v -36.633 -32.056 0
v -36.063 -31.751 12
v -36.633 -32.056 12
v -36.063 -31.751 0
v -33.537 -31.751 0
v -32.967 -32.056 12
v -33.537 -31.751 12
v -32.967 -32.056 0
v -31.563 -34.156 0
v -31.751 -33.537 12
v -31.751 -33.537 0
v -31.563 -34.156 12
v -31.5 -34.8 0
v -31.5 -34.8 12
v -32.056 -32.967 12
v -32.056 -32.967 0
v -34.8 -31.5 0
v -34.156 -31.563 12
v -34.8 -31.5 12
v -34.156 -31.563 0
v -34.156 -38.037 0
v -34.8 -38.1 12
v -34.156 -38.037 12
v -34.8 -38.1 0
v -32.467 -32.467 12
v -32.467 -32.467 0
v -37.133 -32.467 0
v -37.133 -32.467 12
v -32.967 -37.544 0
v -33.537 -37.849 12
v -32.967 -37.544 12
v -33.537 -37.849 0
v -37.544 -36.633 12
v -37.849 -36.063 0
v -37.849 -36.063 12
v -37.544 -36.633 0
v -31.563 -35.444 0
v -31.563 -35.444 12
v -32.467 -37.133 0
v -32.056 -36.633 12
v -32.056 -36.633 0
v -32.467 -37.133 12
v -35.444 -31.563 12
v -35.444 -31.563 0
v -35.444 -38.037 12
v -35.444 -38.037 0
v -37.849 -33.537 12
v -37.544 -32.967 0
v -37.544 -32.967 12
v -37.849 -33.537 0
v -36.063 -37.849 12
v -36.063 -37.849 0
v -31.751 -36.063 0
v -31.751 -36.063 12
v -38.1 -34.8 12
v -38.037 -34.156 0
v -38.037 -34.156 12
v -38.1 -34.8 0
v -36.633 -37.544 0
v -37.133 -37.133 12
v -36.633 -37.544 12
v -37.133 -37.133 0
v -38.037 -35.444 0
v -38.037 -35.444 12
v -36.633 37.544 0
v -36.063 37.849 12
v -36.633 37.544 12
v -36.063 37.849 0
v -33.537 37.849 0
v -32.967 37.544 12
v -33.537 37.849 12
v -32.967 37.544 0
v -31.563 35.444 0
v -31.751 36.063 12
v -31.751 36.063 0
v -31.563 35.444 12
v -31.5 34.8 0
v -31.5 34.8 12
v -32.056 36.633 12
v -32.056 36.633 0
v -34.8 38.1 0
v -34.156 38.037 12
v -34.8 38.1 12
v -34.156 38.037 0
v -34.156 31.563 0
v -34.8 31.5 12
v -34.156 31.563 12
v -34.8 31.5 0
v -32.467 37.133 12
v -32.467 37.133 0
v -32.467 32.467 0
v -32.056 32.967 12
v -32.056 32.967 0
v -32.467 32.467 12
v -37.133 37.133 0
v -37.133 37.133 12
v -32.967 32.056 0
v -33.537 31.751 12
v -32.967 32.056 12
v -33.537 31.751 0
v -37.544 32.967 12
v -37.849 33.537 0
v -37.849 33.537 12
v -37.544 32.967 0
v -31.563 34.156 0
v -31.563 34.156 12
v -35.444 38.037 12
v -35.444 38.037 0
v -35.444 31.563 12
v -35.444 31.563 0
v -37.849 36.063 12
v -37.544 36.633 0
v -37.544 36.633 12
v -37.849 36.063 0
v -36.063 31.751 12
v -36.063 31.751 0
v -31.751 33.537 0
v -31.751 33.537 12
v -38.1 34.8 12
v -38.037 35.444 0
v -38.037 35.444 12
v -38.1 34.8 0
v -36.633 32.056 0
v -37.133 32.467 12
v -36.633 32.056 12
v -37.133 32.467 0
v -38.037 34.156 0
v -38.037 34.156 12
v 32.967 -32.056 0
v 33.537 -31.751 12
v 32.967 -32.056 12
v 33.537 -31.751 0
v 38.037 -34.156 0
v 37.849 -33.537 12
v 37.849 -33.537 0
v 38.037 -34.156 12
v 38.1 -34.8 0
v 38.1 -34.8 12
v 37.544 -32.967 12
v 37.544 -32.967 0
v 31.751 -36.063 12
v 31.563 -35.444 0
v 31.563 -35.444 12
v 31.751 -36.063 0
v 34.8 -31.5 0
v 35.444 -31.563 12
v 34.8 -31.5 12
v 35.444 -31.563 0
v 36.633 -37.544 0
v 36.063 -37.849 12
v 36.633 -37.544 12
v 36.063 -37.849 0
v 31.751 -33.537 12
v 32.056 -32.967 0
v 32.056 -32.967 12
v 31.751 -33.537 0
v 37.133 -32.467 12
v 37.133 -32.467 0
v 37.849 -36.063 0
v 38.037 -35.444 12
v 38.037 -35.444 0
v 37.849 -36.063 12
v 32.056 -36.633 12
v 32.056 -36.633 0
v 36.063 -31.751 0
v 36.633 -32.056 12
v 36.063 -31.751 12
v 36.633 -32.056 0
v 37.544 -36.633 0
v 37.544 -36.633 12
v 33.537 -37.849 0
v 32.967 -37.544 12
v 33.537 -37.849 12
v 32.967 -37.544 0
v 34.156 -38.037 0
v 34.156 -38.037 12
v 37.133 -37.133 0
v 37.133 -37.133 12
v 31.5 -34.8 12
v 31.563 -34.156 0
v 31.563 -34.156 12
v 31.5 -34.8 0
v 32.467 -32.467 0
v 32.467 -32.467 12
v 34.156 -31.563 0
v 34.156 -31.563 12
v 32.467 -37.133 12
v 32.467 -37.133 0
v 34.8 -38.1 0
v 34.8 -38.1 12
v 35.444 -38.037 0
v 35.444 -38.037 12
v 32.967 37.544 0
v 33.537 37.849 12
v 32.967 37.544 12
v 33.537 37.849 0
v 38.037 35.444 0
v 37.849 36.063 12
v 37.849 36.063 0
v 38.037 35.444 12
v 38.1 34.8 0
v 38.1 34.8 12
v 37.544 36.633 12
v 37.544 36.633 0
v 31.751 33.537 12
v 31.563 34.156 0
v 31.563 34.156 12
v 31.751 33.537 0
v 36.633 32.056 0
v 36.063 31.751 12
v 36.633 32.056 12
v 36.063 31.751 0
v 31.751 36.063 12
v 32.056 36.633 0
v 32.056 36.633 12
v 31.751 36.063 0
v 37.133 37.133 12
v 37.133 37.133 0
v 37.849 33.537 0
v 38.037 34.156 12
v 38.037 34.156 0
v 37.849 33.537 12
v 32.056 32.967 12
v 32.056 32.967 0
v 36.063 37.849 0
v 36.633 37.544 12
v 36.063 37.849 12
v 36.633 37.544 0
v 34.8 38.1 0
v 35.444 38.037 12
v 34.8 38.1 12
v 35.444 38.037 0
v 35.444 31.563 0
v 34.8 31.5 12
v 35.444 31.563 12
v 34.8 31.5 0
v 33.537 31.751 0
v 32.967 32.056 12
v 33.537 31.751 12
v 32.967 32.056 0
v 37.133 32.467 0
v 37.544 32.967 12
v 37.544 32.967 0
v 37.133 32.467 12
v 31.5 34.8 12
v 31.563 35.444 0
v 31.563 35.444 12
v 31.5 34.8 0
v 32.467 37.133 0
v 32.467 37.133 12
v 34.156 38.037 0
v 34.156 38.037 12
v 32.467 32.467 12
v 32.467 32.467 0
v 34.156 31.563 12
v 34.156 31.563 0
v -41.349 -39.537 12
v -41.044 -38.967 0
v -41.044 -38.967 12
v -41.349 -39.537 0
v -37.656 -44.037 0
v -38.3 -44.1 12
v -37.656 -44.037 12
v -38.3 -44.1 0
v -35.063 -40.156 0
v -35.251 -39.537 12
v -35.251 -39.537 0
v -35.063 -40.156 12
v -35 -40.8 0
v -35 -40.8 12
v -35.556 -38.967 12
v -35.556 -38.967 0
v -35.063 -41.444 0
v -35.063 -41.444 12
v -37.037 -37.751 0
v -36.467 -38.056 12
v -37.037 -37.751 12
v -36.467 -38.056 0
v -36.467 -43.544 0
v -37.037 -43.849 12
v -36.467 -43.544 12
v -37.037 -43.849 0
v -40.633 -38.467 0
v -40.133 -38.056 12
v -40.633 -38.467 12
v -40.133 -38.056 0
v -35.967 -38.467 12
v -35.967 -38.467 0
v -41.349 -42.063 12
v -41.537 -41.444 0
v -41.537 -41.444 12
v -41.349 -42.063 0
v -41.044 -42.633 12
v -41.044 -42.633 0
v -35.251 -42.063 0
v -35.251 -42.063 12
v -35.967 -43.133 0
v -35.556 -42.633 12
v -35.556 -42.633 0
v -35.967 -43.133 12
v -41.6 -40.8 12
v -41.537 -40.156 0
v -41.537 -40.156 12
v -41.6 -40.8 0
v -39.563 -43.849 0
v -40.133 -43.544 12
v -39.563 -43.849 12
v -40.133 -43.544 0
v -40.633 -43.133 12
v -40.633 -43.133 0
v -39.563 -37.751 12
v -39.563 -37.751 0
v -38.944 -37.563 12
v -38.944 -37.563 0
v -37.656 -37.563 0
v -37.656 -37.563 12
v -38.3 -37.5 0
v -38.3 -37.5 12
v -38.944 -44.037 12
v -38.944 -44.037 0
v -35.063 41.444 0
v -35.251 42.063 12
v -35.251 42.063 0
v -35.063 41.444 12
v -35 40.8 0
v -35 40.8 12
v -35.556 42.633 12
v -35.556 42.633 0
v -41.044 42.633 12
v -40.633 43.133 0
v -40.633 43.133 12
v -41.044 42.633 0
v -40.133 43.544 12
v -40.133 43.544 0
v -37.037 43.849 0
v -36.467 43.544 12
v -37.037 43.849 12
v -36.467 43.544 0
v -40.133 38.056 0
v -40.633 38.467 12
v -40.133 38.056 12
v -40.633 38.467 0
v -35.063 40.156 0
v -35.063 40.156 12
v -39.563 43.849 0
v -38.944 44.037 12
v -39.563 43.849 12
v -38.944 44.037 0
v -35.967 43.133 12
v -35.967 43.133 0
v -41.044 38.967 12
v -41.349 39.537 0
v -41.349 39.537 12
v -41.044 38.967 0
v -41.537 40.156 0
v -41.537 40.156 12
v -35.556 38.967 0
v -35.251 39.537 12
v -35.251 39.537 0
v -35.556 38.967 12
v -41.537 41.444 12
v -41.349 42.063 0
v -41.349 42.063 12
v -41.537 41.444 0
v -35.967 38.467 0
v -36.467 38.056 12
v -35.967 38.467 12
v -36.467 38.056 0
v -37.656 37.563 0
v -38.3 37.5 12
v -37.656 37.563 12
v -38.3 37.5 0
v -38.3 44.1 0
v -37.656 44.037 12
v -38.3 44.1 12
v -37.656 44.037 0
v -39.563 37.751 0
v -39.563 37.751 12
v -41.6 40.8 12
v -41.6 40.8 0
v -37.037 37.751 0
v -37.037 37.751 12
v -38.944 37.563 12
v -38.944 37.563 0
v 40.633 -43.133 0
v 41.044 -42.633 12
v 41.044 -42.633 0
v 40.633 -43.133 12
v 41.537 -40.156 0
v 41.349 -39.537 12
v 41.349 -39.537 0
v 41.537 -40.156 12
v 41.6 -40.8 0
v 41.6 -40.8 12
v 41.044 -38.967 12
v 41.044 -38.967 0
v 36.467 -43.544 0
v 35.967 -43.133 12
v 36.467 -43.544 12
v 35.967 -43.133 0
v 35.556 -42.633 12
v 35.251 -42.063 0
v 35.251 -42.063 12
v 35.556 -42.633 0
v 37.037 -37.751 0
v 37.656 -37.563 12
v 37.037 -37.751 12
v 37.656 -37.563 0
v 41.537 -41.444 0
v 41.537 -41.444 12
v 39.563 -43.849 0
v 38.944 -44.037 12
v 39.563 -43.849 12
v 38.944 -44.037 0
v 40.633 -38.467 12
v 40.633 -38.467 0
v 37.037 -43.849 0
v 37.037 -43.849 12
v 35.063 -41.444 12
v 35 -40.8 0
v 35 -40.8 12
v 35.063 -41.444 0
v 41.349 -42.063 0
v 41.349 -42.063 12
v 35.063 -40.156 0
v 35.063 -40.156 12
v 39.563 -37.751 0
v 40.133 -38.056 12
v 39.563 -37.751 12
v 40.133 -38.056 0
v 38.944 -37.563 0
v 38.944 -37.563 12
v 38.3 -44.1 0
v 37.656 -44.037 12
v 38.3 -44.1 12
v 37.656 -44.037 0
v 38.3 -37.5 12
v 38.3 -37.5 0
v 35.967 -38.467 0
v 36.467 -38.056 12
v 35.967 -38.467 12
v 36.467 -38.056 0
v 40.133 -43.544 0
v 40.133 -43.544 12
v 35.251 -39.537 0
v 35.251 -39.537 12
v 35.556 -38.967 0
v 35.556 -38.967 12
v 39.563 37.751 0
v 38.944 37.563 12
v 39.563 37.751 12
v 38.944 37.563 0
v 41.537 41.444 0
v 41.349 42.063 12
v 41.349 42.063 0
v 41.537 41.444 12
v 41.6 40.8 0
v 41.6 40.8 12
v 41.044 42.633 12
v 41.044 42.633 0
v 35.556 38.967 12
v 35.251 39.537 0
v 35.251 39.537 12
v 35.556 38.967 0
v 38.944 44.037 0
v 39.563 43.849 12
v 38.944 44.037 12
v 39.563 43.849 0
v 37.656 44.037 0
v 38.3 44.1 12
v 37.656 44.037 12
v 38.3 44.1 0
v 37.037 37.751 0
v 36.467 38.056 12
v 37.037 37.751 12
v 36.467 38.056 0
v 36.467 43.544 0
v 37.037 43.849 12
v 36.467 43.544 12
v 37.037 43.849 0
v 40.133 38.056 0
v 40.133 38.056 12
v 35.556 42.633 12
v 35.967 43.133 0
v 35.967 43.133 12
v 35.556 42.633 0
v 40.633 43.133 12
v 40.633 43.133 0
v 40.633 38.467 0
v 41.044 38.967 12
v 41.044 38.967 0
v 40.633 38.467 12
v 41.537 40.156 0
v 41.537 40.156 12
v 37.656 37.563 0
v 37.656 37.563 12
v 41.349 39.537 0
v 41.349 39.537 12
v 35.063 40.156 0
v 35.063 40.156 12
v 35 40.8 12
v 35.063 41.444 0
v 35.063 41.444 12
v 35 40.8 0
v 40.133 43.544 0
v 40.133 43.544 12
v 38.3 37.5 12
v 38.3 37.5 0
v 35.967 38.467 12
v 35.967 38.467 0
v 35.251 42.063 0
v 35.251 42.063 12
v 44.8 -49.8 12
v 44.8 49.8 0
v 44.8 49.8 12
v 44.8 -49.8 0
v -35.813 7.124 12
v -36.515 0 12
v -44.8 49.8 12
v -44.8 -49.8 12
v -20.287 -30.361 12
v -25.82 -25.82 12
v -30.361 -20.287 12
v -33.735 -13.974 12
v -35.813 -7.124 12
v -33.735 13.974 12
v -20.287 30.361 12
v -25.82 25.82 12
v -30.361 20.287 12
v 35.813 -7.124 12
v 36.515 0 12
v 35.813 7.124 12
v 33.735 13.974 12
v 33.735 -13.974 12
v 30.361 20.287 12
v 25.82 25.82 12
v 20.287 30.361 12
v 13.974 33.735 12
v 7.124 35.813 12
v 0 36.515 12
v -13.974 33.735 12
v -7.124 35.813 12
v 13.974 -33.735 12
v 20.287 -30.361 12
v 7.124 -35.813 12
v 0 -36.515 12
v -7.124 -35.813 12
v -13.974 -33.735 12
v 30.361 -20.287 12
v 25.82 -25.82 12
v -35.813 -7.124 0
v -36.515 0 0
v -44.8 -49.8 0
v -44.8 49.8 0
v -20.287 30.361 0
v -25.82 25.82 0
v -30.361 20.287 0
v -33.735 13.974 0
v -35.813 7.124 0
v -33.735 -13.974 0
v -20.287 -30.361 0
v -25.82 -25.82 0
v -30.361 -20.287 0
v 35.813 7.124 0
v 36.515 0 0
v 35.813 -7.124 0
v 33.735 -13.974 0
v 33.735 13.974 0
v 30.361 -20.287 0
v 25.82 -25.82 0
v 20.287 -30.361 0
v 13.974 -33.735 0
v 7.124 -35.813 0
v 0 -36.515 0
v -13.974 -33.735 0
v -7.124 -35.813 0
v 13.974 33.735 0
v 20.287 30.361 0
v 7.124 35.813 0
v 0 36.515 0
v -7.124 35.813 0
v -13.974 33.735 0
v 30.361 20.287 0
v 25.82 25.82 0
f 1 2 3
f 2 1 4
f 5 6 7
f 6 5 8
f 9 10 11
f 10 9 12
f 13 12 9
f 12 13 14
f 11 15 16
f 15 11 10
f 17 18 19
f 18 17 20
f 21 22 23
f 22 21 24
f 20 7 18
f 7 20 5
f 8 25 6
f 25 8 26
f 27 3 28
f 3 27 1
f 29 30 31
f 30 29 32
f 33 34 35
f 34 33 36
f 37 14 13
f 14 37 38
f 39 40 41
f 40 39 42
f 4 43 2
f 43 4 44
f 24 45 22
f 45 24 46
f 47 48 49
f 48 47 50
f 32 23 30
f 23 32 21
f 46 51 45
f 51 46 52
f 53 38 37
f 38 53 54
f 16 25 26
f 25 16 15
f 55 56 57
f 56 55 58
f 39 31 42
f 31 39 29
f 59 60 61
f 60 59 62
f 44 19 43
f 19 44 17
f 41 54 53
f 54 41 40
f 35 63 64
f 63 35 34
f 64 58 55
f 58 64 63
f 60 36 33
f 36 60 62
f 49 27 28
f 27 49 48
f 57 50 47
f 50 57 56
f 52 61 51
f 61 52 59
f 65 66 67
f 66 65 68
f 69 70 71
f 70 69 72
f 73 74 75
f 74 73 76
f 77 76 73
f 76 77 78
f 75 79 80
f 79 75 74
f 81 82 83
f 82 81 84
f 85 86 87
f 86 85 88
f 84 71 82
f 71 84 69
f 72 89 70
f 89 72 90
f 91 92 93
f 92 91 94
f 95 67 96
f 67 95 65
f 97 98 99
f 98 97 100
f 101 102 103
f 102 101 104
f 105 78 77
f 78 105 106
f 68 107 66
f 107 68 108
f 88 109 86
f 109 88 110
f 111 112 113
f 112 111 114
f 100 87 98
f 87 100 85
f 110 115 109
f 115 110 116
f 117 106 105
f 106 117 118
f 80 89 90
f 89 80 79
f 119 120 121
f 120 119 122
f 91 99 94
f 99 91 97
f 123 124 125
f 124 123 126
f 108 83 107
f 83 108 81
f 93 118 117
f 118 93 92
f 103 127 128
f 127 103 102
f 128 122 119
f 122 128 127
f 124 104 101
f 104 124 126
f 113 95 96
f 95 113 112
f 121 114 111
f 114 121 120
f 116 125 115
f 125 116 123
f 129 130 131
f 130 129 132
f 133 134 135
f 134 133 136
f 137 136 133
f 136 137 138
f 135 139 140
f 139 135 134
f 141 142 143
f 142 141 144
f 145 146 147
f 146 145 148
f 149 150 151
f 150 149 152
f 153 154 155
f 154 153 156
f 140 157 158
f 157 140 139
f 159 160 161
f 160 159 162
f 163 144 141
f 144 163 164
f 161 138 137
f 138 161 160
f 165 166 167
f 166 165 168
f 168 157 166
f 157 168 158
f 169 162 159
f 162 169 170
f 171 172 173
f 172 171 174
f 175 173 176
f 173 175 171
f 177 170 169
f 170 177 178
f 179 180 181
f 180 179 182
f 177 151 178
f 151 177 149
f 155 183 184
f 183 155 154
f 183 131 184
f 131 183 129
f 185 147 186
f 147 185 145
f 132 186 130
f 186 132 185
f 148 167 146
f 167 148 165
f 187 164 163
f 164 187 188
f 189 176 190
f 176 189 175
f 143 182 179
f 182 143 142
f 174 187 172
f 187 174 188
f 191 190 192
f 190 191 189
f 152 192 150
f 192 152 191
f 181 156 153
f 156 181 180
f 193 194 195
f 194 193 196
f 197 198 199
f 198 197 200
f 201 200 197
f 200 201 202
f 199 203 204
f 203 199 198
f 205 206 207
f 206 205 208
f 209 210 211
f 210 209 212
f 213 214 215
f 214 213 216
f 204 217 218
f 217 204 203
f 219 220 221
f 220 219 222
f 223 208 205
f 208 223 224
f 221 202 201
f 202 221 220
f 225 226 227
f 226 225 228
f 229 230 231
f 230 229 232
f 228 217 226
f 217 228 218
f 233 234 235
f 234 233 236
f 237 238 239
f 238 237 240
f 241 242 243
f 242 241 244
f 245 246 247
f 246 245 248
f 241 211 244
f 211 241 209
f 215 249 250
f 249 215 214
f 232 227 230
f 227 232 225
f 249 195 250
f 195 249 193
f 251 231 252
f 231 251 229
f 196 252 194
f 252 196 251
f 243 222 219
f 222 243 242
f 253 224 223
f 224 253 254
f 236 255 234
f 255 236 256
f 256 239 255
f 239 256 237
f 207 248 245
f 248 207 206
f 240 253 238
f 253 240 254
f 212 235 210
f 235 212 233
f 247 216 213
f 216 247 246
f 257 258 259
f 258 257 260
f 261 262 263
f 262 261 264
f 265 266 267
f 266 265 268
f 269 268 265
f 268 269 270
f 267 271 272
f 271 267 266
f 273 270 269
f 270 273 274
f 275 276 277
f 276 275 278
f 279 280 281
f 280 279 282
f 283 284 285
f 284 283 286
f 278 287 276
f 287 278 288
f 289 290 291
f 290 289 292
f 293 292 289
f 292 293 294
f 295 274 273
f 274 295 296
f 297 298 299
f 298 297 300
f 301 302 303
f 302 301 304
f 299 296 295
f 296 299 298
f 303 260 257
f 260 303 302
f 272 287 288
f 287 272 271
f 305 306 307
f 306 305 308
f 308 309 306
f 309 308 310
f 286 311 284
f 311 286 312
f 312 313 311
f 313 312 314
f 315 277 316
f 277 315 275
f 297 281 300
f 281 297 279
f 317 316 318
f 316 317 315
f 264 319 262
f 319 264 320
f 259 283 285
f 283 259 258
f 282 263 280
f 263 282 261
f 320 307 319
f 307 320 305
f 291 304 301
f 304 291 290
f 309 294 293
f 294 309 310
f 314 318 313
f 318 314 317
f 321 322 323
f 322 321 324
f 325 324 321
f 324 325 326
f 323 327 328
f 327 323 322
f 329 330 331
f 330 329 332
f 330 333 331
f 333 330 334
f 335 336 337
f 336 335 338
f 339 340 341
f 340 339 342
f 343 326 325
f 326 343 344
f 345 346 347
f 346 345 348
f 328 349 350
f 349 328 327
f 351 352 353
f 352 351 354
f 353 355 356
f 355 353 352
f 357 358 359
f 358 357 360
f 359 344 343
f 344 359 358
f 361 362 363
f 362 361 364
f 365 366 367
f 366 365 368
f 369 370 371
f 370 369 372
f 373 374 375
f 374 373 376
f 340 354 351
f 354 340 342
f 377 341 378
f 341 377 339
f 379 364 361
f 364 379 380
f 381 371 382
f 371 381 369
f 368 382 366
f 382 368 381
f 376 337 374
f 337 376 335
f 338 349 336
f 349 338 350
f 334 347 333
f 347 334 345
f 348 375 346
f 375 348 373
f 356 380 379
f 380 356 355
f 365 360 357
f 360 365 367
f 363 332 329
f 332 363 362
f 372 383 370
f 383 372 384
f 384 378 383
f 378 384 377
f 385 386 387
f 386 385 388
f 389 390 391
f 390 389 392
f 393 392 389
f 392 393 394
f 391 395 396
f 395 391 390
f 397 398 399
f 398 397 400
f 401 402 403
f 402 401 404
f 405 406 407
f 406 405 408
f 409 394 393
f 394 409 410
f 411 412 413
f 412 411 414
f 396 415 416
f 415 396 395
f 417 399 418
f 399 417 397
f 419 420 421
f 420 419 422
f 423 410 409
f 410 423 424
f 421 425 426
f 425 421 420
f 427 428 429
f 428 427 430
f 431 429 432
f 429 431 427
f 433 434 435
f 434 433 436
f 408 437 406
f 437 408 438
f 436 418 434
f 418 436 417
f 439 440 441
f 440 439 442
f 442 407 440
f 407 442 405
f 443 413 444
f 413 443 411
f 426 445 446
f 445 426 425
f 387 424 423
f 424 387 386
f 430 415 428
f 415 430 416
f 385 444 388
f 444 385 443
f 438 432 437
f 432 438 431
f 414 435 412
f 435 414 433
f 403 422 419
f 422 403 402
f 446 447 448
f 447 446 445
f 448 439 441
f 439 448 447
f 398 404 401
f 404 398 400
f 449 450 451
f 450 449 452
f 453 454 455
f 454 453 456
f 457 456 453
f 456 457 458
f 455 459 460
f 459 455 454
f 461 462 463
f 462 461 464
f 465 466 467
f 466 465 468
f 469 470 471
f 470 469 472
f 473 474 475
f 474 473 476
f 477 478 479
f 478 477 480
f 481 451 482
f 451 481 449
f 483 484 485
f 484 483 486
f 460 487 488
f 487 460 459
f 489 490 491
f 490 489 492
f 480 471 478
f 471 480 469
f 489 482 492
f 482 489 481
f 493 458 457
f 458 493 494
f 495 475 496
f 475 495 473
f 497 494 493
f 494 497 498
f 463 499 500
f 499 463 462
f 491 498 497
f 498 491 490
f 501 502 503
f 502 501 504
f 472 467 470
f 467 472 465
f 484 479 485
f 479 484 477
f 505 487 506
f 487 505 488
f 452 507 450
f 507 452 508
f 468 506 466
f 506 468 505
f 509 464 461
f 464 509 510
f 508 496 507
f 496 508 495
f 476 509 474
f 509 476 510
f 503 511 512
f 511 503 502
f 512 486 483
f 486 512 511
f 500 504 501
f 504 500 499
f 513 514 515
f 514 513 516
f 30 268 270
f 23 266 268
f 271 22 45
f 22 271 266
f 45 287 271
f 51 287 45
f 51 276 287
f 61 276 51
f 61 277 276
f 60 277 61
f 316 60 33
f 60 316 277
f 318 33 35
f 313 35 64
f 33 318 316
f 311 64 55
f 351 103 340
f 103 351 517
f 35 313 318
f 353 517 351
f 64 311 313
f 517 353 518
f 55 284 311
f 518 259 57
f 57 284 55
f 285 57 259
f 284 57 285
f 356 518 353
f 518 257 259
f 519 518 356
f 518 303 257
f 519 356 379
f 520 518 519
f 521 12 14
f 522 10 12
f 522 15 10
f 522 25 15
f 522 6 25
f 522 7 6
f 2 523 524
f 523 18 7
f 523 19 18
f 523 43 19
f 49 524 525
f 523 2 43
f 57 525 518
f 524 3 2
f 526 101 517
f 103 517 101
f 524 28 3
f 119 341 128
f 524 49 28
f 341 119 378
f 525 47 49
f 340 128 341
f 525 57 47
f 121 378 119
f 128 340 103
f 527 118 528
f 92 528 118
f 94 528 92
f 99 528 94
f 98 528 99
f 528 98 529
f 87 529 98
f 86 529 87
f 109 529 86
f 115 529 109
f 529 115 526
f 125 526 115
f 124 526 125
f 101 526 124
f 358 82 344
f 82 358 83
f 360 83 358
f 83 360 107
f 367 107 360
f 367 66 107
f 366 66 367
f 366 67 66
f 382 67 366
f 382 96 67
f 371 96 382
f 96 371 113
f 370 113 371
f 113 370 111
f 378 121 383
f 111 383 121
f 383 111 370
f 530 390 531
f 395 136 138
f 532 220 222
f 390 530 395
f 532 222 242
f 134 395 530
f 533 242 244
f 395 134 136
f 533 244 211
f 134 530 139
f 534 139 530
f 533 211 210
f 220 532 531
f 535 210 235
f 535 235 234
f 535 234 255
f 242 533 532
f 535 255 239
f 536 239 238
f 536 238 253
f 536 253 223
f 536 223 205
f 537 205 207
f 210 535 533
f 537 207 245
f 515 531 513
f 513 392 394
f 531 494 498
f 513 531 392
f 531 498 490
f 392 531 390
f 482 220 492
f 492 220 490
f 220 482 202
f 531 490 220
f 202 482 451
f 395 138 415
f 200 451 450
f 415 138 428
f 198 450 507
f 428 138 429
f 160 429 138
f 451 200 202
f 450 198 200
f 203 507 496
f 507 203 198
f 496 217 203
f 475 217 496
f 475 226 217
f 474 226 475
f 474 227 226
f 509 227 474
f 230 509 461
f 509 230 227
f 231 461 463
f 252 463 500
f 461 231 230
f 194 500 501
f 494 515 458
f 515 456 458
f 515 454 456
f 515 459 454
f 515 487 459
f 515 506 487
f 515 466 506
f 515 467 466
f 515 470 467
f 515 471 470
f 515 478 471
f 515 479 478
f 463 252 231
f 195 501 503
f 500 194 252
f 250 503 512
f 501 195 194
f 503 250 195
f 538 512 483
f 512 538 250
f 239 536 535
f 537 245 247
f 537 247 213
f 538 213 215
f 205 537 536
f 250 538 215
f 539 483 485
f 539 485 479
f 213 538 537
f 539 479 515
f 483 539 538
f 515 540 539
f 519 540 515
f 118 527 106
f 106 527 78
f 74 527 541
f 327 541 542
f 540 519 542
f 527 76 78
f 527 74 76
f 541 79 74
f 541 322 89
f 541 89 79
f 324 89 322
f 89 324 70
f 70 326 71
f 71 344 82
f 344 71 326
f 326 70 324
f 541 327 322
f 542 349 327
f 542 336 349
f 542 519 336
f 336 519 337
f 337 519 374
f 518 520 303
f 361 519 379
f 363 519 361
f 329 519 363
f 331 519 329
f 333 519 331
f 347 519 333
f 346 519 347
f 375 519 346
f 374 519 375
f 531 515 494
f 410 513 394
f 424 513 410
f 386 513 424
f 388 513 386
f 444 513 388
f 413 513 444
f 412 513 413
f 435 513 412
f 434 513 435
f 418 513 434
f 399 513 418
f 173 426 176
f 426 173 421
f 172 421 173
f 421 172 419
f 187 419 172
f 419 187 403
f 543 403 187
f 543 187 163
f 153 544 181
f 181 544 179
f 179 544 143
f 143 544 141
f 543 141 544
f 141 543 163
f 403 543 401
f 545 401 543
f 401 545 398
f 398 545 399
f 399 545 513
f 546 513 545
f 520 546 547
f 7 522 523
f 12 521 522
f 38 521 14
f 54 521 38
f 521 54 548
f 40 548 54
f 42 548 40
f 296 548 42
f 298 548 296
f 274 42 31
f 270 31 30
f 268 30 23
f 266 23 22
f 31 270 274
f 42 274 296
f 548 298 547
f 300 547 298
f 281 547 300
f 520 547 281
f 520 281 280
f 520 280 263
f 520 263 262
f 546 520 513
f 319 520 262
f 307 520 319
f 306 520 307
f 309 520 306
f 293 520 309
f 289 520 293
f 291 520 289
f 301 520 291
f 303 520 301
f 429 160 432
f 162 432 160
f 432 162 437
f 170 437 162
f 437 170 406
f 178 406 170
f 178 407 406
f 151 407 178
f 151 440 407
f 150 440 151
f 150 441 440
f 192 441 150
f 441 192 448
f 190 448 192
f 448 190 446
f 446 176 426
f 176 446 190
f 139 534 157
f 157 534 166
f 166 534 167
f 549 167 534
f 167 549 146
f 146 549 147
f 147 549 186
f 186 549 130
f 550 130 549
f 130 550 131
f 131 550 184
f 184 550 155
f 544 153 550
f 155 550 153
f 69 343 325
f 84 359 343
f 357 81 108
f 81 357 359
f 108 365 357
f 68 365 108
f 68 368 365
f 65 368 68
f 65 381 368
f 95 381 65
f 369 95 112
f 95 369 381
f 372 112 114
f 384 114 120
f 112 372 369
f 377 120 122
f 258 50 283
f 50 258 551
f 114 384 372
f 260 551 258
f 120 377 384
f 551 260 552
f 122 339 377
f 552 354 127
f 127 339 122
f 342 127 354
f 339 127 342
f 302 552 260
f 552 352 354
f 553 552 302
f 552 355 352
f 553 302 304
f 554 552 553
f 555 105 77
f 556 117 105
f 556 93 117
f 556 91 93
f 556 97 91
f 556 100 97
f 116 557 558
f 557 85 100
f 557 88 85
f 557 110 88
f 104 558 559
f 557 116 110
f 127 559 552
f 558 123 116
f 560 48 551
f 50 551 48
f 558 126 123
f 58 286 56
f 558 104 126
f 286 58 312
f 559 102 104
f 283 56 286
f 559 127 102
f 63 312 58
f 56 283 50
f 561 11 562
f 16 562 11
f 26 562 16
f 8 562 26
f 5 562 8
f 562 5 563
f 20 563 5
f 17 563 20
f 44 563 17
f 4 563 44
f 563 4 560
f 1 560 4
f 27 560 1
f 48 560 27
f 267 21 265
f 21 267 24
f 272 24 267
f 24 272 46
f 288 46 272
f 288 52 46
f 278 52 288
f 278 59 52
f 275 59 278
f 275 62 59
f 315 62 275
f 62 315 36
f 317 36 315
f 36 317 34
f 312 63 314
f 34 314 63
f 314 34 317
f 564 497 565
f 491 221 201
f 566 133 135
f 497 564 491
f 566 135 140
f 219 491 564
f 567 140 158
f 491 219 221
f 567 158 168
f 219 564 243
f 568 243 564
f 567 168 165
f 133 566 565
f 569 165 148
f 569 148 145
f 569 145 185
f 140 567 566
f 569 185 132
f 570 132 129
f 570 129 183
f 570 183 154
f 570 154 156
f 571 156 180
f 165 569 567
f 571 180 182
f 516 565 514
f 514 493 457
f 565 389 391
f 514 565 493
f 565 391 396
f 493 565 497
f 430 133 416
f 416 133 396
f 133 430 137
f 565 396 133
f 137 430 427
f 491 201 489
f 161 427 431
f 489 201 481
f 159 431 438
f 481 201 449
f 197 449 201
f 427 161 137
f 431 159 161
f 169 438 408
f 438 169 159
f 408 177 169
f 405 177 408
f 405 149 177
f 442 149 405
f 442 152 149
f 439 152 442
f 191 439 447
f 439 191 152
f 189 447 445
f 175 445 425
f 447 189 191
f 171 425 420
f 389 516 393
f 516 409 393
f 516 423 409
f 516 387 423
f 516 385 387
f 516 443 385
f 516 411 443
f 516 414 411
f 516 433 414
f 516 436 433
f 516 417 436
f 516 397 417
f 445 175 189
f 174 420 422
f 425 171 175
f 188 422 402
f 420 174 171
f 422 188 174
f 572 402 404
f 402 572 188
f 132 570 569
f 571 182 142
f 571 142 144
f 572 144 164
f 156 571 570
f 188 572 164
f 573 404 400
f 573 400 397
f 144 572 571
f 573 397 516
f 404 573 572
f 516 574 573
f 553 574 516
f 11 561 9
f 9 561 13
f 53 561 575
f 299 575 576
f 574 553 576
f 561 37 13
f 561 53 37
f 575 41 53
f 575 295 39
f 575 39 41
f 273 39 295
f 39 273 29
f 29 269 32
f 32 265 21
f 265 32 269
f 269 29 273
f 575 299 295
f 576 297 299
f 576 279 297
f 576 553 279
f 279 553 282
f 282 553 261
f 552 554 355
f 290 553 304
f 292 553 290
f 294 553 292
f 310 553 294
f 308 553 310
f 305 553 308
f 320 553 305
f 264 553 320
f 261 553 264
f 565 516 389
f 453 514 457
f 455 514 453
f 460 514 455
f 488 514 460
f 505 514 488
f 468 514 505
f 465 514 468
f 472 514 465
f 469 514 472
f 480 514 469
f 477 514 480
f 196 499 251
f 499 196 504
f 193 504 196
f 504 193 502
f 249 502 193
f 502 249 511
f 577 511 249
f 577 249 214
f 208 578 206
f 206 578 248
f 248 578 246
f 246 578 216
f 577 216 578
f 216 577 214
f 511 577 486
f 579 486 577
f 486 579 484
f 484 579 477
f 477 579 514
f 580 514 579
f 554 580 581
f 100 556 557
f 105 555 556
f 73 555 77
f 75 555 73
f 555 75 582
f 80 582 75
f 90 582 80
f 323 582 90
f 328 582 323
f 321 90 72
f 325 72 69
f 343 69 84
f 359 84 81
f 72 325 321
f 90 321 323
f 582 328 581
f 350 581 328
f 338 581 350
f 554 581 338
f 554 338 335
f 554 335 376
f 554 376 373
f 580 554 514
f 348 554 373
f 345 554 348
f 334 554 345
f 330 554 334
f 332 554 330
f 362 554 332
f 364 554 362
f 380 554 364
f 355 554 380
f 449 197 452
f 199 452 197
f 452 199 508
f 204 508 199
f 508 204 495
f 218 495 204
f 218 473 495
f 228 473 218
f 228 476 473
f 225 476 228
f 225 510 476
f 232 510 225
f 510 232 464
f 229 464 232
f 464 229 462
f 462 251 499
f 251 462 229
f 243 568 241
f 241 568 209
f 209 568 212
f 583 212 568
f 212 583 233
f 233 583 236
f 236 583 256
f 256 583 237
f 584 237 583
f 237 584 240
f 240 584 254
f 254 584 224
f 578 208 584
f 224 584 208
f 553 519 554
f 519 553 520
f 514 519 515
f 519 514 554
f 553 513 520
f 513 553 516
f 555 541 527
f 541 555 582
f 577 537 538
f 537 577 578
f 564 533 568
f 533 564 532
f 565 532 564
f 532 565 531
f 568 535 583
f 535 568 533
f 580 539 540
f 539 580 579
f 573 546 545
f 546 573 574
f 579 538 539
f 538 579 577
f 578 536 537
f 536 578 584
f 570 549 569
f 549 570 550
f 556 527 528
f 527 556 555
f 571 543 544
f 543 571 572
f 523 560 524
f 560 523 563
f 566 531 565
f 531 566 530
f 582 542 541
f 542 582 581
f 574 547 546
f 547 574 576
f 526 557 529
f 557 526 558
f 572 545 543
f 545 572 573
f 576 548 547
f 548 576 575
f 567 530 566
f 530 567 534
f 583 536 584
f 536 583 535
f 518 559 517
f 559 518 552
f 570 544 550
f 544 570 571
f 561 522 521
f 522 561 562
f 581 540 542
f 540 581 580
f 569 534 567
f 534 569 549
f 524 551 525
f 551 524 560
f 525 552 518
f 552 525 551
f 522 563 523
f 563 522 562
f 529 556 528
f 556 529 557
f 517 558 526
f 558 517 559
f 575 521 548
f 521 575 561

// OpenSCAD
$fn = 32;

// ----------------------------------------------------------------------
// Motor mount plate: NEMA34, 89.6 x 99.6 x 12 mm
// ----------------------------------------------------------------------

// --- parameters (mm) ---
plate_w = 89.6;           // plate length, X
plate_d = 99.6;           // plate width, Y
plate_t = 12;             // plate thickness
pattern = 69.6;           // NEMA34 bolt spacing
motor_d = 6.6;            // NEMA34 screw clearance
pilot_d = 73.03;          // pilot boss bore
second_d = 6.6;           // second fastener hole

module plate() {
  translate([-plate_w / 2, -plate_d / 2, 0]) cube([plate_w, plate_d, plate_t]);
}

module motor_holes() {
  for (sx = [-1, 1]) for (sy = [-1, 1])
    translate([sx * pattern / 2, sy * pattern / 2, -1])
      cylinder(h = plate_t + 2, d = motor_d);
}

difference() {
  union() {
    plate();
  }
  motor_holes();
  translate([0, 0, -1]) cylinder(h = plate_t + 2, d = pilot_d);
  for (sx = [-1, 1]) for (sy = [-1, 1])
    translate([sx * 38.3, sy * 40.8, -1]) cylinder(h = plate_t + 2, d = second_d);
}
